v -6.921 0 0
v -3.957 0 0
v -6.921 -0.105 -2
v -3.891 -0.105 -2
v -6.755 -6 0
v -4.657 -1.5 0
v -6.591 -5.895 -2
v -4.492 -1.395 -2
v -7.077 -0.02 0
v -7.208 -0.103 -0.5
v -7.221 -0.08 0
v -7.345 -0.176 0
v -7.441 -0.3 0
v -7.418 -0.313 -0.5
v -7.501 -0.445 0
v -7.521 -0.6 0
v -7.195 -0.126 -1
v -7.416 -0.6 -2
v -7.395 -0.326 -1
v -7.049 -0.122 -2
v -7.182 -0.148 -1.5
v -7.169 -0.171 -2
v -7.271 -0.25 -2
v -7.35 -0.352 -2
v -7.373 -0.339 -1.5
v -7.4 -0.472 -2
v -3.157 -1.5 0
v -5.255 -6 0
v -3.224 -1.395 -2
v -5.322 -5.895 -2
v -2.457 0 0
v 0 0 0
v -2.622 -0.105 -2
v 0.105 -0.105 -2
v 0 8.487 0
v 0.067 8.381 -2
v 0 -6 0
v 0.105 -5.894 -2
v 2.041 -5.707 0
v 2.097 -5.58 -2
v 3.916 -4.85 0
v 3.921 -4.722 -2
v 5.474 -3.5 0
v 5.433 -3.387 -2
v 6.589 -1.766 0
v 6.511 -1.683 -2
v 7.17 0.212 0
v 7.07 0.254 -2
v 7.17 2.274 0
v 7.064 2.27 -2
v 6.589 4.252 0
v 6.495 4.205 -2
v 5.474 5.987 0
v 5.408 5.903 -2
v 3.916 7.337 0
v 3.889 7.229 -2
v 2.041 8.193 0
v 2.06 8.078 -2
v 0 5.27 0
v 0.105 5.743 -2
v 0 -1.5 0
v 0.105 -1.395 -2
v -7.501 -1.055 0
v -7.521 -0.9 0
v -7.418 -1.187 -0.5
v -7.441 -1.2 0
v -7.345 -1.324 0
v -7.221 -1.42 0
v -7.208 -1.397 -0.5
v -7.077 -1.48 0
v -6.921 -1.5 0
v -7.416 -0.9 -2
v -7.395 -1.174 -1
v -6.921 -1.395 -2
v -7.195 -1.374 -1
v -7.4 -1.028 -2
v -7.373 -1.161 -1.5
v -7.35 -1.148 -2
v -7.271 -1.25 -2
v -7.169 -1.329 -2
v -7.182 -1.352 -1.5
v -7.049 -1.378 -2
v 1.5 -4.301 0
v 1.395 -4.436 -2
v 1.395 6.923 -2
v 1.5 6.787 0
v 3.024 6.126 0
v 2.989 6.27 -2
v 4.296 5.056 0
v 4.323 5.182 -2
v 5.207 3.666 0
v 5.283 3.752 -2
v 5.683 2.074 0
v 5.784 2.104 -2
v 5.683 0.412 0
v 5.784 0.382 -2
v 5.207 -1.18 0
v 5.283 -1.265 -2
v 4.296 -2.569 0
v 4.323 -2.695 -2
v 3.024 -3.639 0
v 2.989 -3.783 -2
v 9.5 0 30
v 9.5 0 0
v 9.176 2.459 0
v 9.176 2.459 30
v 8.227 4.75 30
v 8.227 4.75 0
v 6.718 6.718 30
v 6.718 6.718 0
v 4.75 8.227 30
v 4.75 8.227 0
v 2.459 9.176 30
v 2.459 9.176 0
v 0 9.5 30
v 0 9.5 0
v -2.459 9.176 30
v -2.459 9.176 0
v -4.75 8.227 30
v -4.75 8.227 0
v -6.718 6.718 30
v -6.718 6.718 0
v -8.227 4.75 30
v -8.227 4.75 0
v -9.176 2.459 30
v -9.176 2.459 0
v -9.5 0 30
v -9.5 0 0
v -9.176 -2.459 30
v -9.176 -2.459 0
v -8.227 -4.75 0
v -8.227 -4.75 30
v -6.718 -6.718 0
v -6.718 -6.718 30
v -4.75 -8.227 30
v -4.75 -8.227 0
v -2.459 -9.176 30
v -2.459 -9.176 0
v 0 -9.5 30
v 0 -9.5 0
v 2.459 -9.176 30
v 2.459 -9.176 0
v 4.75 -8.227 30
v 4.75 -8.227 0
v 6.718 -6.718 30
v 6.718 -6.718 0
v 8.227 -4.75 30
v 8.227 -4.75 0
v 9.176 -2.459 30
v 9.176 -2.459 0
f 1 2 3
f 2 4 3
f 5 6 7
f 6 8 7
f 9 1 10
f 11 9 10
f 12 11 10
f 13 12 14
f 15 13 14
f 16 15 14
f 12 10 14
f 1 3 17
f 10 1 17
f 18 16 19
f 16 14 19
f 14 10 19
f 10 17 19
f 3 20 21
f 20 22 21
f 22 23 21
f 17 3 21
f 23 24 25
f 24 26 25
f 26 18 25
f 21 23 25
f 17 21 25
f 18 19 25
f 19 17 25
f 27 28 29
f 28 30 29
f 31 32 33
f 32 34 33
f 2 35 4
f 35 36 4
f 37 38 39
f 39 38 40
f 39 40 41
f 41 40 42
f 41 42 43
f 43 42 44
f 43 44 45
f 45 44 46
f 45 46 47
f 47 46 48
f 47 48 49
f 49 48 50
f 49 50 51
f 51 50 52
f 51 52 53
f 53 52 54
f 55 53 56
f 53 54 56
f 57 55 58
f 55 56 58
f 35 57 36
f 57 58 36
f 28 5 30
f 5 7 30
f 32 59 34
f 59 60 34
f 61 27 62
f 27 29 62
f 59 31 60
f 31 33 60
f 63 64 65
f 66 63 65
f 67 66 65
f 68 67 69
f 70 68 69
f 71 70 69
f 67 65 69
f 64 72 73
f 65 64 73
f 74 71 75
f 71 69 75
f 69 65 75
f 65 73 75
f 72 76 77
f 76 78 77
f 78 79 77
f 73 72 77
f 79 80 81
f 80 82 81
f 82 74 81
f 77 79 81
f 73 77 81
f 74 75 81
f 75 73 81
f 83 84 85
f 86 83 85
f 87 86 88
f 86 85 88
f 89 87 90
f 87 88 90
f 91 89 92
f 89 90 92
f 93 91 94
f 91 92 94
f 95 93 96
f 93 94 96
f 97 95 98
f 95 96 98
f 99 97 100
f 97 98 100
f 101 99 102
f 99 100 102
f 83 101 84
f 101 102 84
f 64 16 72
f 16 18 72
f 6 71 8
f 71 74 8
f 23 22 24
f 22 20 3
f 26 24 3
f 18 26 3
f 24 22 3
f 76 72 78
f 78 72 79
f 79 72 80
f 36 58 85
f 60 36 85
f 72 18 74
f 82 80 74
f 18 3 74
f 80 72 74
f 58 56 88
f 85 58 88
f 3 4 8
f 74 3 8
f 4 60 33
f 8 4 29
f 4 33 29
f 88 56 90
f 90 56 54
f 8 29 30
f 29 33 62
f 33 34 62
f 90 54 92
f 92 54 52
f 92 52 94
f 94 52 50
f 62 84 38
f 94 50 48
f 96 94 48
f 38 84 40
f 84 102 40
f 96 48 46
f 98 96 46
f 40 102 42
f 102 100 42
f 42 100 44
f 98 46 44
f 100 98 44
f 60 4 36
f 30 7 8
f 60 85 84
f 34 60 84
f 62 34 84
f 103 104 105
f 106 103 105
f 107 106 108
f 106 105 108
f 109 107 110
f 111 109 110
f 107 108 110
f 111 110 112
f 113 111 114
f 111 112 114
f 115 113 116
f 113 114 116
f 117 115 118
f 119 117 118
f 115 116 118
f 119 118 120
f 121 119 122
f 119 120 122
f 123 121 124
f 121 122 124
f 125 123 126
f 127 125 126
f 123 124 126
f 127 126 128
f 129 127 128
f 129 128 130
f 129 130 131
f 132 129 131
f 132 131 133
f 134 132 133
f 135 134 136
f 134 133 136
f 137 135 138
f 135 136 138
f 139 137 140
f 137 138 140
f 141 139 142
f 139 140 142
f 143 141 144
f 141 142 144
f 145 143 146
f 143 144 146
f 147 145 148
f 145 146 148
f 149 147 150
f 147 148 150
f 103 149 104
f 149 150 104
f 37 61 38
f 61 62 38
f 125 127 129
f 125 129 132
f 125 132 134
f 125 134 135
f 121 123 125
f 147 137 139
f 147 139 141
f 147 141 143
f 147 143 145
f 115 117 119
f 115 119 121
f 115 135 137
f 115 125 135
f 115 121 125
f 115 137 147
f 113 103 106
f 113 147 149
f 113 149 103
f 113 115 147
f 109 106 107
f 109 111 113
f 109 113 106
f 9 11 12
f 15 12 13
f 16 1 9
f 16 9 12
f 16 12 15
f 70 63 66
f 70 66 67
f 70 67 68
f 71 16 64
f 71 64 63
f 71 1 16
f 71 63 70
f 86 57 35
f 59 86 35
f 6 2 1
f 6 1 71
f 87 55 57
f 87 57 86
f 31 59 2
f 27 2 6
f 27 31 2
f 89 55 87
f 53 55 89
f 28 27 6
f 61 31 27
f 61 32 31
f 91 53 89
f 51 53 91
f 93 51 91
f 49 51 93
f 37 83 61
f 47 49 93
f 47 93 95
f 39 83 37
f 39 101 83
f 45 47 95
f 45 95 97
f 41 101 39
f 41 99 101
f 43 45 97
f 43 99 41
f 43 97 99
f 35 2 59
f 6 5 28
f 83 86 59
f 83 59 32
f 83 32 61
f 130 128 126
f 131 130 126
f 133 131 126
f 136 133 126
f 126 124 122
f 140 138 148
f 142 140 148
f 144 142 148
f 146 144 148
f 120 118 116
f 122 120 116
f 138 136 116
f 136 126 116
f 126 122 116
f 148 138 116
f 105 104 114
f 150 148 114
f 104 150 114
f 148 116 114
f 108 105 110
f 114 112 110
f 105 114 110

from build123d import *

# Parameters (mm, degrees)
F1_DEPTH = 2
F1_TAPER = 3
F0_R     = 9.5
F2_DEPTH = 30


with BuildPart() as f1:
    # F0 (on Top) → F1 (new body)
    with BuildSketch(Plane.XY):
        with BuildLine():
            ThreePointArc((0, -6), (7.2433005399, 1.2433005399), (0, 8.4866010798))
            Line((0, 8.4866010798), (-3.9573670752, 0))
            Line((-3.9573670752, 0), (-6.9212134549, 0))
            ThreePointArc((-6.9212134549, 0), (-7.3454775236, -0.1757359313), (-7.5212134549, -0.6))
            Line((-7.5212134549, -0.6), (-7.5212134549, -0.9))
            ThreePointArc((-7.5212134549, -0.9), (-7.3454775236, -1.3242640687), (-6.9212134549, -1.5))
            Line((-6.9212134549, -1.5), (-4.6568285624, -1.5))
            Line((-4.6568285624, -1.5), (-6.7552130241, -6))
            Line((-6.7552130241, -6), (-5.2552130241, -6))
            Line((-5.2552130241, -6), (-3.1568285624, -1.5))
            Line((-3.1568285624, -1.5), (0, -1.5))
            Line((0, -1.5), (0, -6))
        make_face()
        Polygon((0, 0), (-2.4573670752, 0), (0, 5.269840699), align=None, mode=Mode.SUBTRACT)
        with BuildLine():
            Line((1.5, -4.3006602366), (1.5, 6.7872613164))
            ThreePointArc((1.5, 6.7872613164), (5.7433005399, 1.2433005399), (1.5, -4.3006602366))
        make_face(mode=Mode.SUBTRACT)
    extrude(amount=-F1_DEPTH, taper=F1_TAPER)


with BuildPart() as f2:
    # F0 (on Top) → F2 (new body)
    with BuildSketch(Plane.XY):
        Circle(F0_R)
        with BuildLine():
            Line((-3.9573670752, 0), (0, 8.4866010798))
            ThreePointArc((0, 8.4866010798), (7.2433005399, 1.2433005399), (0, -6))
            Line((0, -6), (0, -1.5))
            Line((0, -1.5), (-3.1568285624, -1.5))
            Line((-3.1568285624, -1.5), (-5.2552130241, -6))
            Line((-5.2552130241, -6), (-6.7552130241, -6))
            Line((-6.7552130241, -6), (-4.6568285624, -1.5))
            Line((-4.6568285624, -1.5), (-6.9212134549, -1.5))
            ThreePointArc((-6.9212134549, -1.5), (-7.3454775236, -1.3242640687), (-7.5212134549, -0.9))
            Line((-7.5212134549, -0.9), (-7.5212134549, -0.6))
            ThreePointArc((-7.5212134549, -0.6), (-7.3454775236, -0.1757359313), (-6.9212134549, 0))
            Line((-6.9212134549, 0), (-3.9573670752, 0))
        make_face(mode=Mode.SUBTRACT)
        with BuildLine():
            ThreePointArc((0, -6), (7.2433005399, 1.2433005399), (0, 8.4866010798))
            Line((0, 8.4866010798), (-3.9573670752, 0))
            Line((-3.9573670752, 0), (-6.9212134549, 0))
            ThreePointArc((-6.9212134549, 0), (-7.3454775236, -0.1757359313), (-7.5212134549, -0.6))
            Line((-7.5212134549, -0.6), (-7.5212134549, -0.9))
            ThreePointArc((-7.5212134549, -0.9), (-7.3454775236, -1.3242640687), (-6.9212134549, -1.5))
            Line((-6.9212134549, -1.5), (-4.6568285624, -1.5))
            Line((-4.6568285624, -1.5), (-6.7552130241, -6))
            Line((-6.7552130241, -6), (-5.2552130241, -6))
            Line((-5.2552130241, -6), (-3.1568285624, -1.5))
            Line((-3.1568285624, -1.5), (0, -1.5))
            Line((0, -1.5), (0, -6))
        make_face()
        Polygon((0, 0), (-2.4573670752, 0), (0, 5.269840699), align=None, mode=Mode.SUBTRACT)
        with BuildLine():
            Line((1.5, -4.3006602366), (1.5, 6.7872613164))
            ThreePointArc((1.5, 6.7872613164), (5.7433005399, 1.2433005399), (1.5, -4.3006602366))
        make_face(mode=Mode.SUBTRACT)
        Polygon((0, 5.269840699), (-2.4573670752, 0), (0, 0), align=None)
        with BuildLine():
            ThreePointArc((1.5, -4.3006602366), (5.7433005399, 1.2433005399), (1.5, 6.7872613164))
            Line((1.5, 6.7872613164), (1.5, -4.3006602366))
        make_face()
    extrude(amount=F2_DEPTH)


solid = Compound([f1.part, f2.part])
